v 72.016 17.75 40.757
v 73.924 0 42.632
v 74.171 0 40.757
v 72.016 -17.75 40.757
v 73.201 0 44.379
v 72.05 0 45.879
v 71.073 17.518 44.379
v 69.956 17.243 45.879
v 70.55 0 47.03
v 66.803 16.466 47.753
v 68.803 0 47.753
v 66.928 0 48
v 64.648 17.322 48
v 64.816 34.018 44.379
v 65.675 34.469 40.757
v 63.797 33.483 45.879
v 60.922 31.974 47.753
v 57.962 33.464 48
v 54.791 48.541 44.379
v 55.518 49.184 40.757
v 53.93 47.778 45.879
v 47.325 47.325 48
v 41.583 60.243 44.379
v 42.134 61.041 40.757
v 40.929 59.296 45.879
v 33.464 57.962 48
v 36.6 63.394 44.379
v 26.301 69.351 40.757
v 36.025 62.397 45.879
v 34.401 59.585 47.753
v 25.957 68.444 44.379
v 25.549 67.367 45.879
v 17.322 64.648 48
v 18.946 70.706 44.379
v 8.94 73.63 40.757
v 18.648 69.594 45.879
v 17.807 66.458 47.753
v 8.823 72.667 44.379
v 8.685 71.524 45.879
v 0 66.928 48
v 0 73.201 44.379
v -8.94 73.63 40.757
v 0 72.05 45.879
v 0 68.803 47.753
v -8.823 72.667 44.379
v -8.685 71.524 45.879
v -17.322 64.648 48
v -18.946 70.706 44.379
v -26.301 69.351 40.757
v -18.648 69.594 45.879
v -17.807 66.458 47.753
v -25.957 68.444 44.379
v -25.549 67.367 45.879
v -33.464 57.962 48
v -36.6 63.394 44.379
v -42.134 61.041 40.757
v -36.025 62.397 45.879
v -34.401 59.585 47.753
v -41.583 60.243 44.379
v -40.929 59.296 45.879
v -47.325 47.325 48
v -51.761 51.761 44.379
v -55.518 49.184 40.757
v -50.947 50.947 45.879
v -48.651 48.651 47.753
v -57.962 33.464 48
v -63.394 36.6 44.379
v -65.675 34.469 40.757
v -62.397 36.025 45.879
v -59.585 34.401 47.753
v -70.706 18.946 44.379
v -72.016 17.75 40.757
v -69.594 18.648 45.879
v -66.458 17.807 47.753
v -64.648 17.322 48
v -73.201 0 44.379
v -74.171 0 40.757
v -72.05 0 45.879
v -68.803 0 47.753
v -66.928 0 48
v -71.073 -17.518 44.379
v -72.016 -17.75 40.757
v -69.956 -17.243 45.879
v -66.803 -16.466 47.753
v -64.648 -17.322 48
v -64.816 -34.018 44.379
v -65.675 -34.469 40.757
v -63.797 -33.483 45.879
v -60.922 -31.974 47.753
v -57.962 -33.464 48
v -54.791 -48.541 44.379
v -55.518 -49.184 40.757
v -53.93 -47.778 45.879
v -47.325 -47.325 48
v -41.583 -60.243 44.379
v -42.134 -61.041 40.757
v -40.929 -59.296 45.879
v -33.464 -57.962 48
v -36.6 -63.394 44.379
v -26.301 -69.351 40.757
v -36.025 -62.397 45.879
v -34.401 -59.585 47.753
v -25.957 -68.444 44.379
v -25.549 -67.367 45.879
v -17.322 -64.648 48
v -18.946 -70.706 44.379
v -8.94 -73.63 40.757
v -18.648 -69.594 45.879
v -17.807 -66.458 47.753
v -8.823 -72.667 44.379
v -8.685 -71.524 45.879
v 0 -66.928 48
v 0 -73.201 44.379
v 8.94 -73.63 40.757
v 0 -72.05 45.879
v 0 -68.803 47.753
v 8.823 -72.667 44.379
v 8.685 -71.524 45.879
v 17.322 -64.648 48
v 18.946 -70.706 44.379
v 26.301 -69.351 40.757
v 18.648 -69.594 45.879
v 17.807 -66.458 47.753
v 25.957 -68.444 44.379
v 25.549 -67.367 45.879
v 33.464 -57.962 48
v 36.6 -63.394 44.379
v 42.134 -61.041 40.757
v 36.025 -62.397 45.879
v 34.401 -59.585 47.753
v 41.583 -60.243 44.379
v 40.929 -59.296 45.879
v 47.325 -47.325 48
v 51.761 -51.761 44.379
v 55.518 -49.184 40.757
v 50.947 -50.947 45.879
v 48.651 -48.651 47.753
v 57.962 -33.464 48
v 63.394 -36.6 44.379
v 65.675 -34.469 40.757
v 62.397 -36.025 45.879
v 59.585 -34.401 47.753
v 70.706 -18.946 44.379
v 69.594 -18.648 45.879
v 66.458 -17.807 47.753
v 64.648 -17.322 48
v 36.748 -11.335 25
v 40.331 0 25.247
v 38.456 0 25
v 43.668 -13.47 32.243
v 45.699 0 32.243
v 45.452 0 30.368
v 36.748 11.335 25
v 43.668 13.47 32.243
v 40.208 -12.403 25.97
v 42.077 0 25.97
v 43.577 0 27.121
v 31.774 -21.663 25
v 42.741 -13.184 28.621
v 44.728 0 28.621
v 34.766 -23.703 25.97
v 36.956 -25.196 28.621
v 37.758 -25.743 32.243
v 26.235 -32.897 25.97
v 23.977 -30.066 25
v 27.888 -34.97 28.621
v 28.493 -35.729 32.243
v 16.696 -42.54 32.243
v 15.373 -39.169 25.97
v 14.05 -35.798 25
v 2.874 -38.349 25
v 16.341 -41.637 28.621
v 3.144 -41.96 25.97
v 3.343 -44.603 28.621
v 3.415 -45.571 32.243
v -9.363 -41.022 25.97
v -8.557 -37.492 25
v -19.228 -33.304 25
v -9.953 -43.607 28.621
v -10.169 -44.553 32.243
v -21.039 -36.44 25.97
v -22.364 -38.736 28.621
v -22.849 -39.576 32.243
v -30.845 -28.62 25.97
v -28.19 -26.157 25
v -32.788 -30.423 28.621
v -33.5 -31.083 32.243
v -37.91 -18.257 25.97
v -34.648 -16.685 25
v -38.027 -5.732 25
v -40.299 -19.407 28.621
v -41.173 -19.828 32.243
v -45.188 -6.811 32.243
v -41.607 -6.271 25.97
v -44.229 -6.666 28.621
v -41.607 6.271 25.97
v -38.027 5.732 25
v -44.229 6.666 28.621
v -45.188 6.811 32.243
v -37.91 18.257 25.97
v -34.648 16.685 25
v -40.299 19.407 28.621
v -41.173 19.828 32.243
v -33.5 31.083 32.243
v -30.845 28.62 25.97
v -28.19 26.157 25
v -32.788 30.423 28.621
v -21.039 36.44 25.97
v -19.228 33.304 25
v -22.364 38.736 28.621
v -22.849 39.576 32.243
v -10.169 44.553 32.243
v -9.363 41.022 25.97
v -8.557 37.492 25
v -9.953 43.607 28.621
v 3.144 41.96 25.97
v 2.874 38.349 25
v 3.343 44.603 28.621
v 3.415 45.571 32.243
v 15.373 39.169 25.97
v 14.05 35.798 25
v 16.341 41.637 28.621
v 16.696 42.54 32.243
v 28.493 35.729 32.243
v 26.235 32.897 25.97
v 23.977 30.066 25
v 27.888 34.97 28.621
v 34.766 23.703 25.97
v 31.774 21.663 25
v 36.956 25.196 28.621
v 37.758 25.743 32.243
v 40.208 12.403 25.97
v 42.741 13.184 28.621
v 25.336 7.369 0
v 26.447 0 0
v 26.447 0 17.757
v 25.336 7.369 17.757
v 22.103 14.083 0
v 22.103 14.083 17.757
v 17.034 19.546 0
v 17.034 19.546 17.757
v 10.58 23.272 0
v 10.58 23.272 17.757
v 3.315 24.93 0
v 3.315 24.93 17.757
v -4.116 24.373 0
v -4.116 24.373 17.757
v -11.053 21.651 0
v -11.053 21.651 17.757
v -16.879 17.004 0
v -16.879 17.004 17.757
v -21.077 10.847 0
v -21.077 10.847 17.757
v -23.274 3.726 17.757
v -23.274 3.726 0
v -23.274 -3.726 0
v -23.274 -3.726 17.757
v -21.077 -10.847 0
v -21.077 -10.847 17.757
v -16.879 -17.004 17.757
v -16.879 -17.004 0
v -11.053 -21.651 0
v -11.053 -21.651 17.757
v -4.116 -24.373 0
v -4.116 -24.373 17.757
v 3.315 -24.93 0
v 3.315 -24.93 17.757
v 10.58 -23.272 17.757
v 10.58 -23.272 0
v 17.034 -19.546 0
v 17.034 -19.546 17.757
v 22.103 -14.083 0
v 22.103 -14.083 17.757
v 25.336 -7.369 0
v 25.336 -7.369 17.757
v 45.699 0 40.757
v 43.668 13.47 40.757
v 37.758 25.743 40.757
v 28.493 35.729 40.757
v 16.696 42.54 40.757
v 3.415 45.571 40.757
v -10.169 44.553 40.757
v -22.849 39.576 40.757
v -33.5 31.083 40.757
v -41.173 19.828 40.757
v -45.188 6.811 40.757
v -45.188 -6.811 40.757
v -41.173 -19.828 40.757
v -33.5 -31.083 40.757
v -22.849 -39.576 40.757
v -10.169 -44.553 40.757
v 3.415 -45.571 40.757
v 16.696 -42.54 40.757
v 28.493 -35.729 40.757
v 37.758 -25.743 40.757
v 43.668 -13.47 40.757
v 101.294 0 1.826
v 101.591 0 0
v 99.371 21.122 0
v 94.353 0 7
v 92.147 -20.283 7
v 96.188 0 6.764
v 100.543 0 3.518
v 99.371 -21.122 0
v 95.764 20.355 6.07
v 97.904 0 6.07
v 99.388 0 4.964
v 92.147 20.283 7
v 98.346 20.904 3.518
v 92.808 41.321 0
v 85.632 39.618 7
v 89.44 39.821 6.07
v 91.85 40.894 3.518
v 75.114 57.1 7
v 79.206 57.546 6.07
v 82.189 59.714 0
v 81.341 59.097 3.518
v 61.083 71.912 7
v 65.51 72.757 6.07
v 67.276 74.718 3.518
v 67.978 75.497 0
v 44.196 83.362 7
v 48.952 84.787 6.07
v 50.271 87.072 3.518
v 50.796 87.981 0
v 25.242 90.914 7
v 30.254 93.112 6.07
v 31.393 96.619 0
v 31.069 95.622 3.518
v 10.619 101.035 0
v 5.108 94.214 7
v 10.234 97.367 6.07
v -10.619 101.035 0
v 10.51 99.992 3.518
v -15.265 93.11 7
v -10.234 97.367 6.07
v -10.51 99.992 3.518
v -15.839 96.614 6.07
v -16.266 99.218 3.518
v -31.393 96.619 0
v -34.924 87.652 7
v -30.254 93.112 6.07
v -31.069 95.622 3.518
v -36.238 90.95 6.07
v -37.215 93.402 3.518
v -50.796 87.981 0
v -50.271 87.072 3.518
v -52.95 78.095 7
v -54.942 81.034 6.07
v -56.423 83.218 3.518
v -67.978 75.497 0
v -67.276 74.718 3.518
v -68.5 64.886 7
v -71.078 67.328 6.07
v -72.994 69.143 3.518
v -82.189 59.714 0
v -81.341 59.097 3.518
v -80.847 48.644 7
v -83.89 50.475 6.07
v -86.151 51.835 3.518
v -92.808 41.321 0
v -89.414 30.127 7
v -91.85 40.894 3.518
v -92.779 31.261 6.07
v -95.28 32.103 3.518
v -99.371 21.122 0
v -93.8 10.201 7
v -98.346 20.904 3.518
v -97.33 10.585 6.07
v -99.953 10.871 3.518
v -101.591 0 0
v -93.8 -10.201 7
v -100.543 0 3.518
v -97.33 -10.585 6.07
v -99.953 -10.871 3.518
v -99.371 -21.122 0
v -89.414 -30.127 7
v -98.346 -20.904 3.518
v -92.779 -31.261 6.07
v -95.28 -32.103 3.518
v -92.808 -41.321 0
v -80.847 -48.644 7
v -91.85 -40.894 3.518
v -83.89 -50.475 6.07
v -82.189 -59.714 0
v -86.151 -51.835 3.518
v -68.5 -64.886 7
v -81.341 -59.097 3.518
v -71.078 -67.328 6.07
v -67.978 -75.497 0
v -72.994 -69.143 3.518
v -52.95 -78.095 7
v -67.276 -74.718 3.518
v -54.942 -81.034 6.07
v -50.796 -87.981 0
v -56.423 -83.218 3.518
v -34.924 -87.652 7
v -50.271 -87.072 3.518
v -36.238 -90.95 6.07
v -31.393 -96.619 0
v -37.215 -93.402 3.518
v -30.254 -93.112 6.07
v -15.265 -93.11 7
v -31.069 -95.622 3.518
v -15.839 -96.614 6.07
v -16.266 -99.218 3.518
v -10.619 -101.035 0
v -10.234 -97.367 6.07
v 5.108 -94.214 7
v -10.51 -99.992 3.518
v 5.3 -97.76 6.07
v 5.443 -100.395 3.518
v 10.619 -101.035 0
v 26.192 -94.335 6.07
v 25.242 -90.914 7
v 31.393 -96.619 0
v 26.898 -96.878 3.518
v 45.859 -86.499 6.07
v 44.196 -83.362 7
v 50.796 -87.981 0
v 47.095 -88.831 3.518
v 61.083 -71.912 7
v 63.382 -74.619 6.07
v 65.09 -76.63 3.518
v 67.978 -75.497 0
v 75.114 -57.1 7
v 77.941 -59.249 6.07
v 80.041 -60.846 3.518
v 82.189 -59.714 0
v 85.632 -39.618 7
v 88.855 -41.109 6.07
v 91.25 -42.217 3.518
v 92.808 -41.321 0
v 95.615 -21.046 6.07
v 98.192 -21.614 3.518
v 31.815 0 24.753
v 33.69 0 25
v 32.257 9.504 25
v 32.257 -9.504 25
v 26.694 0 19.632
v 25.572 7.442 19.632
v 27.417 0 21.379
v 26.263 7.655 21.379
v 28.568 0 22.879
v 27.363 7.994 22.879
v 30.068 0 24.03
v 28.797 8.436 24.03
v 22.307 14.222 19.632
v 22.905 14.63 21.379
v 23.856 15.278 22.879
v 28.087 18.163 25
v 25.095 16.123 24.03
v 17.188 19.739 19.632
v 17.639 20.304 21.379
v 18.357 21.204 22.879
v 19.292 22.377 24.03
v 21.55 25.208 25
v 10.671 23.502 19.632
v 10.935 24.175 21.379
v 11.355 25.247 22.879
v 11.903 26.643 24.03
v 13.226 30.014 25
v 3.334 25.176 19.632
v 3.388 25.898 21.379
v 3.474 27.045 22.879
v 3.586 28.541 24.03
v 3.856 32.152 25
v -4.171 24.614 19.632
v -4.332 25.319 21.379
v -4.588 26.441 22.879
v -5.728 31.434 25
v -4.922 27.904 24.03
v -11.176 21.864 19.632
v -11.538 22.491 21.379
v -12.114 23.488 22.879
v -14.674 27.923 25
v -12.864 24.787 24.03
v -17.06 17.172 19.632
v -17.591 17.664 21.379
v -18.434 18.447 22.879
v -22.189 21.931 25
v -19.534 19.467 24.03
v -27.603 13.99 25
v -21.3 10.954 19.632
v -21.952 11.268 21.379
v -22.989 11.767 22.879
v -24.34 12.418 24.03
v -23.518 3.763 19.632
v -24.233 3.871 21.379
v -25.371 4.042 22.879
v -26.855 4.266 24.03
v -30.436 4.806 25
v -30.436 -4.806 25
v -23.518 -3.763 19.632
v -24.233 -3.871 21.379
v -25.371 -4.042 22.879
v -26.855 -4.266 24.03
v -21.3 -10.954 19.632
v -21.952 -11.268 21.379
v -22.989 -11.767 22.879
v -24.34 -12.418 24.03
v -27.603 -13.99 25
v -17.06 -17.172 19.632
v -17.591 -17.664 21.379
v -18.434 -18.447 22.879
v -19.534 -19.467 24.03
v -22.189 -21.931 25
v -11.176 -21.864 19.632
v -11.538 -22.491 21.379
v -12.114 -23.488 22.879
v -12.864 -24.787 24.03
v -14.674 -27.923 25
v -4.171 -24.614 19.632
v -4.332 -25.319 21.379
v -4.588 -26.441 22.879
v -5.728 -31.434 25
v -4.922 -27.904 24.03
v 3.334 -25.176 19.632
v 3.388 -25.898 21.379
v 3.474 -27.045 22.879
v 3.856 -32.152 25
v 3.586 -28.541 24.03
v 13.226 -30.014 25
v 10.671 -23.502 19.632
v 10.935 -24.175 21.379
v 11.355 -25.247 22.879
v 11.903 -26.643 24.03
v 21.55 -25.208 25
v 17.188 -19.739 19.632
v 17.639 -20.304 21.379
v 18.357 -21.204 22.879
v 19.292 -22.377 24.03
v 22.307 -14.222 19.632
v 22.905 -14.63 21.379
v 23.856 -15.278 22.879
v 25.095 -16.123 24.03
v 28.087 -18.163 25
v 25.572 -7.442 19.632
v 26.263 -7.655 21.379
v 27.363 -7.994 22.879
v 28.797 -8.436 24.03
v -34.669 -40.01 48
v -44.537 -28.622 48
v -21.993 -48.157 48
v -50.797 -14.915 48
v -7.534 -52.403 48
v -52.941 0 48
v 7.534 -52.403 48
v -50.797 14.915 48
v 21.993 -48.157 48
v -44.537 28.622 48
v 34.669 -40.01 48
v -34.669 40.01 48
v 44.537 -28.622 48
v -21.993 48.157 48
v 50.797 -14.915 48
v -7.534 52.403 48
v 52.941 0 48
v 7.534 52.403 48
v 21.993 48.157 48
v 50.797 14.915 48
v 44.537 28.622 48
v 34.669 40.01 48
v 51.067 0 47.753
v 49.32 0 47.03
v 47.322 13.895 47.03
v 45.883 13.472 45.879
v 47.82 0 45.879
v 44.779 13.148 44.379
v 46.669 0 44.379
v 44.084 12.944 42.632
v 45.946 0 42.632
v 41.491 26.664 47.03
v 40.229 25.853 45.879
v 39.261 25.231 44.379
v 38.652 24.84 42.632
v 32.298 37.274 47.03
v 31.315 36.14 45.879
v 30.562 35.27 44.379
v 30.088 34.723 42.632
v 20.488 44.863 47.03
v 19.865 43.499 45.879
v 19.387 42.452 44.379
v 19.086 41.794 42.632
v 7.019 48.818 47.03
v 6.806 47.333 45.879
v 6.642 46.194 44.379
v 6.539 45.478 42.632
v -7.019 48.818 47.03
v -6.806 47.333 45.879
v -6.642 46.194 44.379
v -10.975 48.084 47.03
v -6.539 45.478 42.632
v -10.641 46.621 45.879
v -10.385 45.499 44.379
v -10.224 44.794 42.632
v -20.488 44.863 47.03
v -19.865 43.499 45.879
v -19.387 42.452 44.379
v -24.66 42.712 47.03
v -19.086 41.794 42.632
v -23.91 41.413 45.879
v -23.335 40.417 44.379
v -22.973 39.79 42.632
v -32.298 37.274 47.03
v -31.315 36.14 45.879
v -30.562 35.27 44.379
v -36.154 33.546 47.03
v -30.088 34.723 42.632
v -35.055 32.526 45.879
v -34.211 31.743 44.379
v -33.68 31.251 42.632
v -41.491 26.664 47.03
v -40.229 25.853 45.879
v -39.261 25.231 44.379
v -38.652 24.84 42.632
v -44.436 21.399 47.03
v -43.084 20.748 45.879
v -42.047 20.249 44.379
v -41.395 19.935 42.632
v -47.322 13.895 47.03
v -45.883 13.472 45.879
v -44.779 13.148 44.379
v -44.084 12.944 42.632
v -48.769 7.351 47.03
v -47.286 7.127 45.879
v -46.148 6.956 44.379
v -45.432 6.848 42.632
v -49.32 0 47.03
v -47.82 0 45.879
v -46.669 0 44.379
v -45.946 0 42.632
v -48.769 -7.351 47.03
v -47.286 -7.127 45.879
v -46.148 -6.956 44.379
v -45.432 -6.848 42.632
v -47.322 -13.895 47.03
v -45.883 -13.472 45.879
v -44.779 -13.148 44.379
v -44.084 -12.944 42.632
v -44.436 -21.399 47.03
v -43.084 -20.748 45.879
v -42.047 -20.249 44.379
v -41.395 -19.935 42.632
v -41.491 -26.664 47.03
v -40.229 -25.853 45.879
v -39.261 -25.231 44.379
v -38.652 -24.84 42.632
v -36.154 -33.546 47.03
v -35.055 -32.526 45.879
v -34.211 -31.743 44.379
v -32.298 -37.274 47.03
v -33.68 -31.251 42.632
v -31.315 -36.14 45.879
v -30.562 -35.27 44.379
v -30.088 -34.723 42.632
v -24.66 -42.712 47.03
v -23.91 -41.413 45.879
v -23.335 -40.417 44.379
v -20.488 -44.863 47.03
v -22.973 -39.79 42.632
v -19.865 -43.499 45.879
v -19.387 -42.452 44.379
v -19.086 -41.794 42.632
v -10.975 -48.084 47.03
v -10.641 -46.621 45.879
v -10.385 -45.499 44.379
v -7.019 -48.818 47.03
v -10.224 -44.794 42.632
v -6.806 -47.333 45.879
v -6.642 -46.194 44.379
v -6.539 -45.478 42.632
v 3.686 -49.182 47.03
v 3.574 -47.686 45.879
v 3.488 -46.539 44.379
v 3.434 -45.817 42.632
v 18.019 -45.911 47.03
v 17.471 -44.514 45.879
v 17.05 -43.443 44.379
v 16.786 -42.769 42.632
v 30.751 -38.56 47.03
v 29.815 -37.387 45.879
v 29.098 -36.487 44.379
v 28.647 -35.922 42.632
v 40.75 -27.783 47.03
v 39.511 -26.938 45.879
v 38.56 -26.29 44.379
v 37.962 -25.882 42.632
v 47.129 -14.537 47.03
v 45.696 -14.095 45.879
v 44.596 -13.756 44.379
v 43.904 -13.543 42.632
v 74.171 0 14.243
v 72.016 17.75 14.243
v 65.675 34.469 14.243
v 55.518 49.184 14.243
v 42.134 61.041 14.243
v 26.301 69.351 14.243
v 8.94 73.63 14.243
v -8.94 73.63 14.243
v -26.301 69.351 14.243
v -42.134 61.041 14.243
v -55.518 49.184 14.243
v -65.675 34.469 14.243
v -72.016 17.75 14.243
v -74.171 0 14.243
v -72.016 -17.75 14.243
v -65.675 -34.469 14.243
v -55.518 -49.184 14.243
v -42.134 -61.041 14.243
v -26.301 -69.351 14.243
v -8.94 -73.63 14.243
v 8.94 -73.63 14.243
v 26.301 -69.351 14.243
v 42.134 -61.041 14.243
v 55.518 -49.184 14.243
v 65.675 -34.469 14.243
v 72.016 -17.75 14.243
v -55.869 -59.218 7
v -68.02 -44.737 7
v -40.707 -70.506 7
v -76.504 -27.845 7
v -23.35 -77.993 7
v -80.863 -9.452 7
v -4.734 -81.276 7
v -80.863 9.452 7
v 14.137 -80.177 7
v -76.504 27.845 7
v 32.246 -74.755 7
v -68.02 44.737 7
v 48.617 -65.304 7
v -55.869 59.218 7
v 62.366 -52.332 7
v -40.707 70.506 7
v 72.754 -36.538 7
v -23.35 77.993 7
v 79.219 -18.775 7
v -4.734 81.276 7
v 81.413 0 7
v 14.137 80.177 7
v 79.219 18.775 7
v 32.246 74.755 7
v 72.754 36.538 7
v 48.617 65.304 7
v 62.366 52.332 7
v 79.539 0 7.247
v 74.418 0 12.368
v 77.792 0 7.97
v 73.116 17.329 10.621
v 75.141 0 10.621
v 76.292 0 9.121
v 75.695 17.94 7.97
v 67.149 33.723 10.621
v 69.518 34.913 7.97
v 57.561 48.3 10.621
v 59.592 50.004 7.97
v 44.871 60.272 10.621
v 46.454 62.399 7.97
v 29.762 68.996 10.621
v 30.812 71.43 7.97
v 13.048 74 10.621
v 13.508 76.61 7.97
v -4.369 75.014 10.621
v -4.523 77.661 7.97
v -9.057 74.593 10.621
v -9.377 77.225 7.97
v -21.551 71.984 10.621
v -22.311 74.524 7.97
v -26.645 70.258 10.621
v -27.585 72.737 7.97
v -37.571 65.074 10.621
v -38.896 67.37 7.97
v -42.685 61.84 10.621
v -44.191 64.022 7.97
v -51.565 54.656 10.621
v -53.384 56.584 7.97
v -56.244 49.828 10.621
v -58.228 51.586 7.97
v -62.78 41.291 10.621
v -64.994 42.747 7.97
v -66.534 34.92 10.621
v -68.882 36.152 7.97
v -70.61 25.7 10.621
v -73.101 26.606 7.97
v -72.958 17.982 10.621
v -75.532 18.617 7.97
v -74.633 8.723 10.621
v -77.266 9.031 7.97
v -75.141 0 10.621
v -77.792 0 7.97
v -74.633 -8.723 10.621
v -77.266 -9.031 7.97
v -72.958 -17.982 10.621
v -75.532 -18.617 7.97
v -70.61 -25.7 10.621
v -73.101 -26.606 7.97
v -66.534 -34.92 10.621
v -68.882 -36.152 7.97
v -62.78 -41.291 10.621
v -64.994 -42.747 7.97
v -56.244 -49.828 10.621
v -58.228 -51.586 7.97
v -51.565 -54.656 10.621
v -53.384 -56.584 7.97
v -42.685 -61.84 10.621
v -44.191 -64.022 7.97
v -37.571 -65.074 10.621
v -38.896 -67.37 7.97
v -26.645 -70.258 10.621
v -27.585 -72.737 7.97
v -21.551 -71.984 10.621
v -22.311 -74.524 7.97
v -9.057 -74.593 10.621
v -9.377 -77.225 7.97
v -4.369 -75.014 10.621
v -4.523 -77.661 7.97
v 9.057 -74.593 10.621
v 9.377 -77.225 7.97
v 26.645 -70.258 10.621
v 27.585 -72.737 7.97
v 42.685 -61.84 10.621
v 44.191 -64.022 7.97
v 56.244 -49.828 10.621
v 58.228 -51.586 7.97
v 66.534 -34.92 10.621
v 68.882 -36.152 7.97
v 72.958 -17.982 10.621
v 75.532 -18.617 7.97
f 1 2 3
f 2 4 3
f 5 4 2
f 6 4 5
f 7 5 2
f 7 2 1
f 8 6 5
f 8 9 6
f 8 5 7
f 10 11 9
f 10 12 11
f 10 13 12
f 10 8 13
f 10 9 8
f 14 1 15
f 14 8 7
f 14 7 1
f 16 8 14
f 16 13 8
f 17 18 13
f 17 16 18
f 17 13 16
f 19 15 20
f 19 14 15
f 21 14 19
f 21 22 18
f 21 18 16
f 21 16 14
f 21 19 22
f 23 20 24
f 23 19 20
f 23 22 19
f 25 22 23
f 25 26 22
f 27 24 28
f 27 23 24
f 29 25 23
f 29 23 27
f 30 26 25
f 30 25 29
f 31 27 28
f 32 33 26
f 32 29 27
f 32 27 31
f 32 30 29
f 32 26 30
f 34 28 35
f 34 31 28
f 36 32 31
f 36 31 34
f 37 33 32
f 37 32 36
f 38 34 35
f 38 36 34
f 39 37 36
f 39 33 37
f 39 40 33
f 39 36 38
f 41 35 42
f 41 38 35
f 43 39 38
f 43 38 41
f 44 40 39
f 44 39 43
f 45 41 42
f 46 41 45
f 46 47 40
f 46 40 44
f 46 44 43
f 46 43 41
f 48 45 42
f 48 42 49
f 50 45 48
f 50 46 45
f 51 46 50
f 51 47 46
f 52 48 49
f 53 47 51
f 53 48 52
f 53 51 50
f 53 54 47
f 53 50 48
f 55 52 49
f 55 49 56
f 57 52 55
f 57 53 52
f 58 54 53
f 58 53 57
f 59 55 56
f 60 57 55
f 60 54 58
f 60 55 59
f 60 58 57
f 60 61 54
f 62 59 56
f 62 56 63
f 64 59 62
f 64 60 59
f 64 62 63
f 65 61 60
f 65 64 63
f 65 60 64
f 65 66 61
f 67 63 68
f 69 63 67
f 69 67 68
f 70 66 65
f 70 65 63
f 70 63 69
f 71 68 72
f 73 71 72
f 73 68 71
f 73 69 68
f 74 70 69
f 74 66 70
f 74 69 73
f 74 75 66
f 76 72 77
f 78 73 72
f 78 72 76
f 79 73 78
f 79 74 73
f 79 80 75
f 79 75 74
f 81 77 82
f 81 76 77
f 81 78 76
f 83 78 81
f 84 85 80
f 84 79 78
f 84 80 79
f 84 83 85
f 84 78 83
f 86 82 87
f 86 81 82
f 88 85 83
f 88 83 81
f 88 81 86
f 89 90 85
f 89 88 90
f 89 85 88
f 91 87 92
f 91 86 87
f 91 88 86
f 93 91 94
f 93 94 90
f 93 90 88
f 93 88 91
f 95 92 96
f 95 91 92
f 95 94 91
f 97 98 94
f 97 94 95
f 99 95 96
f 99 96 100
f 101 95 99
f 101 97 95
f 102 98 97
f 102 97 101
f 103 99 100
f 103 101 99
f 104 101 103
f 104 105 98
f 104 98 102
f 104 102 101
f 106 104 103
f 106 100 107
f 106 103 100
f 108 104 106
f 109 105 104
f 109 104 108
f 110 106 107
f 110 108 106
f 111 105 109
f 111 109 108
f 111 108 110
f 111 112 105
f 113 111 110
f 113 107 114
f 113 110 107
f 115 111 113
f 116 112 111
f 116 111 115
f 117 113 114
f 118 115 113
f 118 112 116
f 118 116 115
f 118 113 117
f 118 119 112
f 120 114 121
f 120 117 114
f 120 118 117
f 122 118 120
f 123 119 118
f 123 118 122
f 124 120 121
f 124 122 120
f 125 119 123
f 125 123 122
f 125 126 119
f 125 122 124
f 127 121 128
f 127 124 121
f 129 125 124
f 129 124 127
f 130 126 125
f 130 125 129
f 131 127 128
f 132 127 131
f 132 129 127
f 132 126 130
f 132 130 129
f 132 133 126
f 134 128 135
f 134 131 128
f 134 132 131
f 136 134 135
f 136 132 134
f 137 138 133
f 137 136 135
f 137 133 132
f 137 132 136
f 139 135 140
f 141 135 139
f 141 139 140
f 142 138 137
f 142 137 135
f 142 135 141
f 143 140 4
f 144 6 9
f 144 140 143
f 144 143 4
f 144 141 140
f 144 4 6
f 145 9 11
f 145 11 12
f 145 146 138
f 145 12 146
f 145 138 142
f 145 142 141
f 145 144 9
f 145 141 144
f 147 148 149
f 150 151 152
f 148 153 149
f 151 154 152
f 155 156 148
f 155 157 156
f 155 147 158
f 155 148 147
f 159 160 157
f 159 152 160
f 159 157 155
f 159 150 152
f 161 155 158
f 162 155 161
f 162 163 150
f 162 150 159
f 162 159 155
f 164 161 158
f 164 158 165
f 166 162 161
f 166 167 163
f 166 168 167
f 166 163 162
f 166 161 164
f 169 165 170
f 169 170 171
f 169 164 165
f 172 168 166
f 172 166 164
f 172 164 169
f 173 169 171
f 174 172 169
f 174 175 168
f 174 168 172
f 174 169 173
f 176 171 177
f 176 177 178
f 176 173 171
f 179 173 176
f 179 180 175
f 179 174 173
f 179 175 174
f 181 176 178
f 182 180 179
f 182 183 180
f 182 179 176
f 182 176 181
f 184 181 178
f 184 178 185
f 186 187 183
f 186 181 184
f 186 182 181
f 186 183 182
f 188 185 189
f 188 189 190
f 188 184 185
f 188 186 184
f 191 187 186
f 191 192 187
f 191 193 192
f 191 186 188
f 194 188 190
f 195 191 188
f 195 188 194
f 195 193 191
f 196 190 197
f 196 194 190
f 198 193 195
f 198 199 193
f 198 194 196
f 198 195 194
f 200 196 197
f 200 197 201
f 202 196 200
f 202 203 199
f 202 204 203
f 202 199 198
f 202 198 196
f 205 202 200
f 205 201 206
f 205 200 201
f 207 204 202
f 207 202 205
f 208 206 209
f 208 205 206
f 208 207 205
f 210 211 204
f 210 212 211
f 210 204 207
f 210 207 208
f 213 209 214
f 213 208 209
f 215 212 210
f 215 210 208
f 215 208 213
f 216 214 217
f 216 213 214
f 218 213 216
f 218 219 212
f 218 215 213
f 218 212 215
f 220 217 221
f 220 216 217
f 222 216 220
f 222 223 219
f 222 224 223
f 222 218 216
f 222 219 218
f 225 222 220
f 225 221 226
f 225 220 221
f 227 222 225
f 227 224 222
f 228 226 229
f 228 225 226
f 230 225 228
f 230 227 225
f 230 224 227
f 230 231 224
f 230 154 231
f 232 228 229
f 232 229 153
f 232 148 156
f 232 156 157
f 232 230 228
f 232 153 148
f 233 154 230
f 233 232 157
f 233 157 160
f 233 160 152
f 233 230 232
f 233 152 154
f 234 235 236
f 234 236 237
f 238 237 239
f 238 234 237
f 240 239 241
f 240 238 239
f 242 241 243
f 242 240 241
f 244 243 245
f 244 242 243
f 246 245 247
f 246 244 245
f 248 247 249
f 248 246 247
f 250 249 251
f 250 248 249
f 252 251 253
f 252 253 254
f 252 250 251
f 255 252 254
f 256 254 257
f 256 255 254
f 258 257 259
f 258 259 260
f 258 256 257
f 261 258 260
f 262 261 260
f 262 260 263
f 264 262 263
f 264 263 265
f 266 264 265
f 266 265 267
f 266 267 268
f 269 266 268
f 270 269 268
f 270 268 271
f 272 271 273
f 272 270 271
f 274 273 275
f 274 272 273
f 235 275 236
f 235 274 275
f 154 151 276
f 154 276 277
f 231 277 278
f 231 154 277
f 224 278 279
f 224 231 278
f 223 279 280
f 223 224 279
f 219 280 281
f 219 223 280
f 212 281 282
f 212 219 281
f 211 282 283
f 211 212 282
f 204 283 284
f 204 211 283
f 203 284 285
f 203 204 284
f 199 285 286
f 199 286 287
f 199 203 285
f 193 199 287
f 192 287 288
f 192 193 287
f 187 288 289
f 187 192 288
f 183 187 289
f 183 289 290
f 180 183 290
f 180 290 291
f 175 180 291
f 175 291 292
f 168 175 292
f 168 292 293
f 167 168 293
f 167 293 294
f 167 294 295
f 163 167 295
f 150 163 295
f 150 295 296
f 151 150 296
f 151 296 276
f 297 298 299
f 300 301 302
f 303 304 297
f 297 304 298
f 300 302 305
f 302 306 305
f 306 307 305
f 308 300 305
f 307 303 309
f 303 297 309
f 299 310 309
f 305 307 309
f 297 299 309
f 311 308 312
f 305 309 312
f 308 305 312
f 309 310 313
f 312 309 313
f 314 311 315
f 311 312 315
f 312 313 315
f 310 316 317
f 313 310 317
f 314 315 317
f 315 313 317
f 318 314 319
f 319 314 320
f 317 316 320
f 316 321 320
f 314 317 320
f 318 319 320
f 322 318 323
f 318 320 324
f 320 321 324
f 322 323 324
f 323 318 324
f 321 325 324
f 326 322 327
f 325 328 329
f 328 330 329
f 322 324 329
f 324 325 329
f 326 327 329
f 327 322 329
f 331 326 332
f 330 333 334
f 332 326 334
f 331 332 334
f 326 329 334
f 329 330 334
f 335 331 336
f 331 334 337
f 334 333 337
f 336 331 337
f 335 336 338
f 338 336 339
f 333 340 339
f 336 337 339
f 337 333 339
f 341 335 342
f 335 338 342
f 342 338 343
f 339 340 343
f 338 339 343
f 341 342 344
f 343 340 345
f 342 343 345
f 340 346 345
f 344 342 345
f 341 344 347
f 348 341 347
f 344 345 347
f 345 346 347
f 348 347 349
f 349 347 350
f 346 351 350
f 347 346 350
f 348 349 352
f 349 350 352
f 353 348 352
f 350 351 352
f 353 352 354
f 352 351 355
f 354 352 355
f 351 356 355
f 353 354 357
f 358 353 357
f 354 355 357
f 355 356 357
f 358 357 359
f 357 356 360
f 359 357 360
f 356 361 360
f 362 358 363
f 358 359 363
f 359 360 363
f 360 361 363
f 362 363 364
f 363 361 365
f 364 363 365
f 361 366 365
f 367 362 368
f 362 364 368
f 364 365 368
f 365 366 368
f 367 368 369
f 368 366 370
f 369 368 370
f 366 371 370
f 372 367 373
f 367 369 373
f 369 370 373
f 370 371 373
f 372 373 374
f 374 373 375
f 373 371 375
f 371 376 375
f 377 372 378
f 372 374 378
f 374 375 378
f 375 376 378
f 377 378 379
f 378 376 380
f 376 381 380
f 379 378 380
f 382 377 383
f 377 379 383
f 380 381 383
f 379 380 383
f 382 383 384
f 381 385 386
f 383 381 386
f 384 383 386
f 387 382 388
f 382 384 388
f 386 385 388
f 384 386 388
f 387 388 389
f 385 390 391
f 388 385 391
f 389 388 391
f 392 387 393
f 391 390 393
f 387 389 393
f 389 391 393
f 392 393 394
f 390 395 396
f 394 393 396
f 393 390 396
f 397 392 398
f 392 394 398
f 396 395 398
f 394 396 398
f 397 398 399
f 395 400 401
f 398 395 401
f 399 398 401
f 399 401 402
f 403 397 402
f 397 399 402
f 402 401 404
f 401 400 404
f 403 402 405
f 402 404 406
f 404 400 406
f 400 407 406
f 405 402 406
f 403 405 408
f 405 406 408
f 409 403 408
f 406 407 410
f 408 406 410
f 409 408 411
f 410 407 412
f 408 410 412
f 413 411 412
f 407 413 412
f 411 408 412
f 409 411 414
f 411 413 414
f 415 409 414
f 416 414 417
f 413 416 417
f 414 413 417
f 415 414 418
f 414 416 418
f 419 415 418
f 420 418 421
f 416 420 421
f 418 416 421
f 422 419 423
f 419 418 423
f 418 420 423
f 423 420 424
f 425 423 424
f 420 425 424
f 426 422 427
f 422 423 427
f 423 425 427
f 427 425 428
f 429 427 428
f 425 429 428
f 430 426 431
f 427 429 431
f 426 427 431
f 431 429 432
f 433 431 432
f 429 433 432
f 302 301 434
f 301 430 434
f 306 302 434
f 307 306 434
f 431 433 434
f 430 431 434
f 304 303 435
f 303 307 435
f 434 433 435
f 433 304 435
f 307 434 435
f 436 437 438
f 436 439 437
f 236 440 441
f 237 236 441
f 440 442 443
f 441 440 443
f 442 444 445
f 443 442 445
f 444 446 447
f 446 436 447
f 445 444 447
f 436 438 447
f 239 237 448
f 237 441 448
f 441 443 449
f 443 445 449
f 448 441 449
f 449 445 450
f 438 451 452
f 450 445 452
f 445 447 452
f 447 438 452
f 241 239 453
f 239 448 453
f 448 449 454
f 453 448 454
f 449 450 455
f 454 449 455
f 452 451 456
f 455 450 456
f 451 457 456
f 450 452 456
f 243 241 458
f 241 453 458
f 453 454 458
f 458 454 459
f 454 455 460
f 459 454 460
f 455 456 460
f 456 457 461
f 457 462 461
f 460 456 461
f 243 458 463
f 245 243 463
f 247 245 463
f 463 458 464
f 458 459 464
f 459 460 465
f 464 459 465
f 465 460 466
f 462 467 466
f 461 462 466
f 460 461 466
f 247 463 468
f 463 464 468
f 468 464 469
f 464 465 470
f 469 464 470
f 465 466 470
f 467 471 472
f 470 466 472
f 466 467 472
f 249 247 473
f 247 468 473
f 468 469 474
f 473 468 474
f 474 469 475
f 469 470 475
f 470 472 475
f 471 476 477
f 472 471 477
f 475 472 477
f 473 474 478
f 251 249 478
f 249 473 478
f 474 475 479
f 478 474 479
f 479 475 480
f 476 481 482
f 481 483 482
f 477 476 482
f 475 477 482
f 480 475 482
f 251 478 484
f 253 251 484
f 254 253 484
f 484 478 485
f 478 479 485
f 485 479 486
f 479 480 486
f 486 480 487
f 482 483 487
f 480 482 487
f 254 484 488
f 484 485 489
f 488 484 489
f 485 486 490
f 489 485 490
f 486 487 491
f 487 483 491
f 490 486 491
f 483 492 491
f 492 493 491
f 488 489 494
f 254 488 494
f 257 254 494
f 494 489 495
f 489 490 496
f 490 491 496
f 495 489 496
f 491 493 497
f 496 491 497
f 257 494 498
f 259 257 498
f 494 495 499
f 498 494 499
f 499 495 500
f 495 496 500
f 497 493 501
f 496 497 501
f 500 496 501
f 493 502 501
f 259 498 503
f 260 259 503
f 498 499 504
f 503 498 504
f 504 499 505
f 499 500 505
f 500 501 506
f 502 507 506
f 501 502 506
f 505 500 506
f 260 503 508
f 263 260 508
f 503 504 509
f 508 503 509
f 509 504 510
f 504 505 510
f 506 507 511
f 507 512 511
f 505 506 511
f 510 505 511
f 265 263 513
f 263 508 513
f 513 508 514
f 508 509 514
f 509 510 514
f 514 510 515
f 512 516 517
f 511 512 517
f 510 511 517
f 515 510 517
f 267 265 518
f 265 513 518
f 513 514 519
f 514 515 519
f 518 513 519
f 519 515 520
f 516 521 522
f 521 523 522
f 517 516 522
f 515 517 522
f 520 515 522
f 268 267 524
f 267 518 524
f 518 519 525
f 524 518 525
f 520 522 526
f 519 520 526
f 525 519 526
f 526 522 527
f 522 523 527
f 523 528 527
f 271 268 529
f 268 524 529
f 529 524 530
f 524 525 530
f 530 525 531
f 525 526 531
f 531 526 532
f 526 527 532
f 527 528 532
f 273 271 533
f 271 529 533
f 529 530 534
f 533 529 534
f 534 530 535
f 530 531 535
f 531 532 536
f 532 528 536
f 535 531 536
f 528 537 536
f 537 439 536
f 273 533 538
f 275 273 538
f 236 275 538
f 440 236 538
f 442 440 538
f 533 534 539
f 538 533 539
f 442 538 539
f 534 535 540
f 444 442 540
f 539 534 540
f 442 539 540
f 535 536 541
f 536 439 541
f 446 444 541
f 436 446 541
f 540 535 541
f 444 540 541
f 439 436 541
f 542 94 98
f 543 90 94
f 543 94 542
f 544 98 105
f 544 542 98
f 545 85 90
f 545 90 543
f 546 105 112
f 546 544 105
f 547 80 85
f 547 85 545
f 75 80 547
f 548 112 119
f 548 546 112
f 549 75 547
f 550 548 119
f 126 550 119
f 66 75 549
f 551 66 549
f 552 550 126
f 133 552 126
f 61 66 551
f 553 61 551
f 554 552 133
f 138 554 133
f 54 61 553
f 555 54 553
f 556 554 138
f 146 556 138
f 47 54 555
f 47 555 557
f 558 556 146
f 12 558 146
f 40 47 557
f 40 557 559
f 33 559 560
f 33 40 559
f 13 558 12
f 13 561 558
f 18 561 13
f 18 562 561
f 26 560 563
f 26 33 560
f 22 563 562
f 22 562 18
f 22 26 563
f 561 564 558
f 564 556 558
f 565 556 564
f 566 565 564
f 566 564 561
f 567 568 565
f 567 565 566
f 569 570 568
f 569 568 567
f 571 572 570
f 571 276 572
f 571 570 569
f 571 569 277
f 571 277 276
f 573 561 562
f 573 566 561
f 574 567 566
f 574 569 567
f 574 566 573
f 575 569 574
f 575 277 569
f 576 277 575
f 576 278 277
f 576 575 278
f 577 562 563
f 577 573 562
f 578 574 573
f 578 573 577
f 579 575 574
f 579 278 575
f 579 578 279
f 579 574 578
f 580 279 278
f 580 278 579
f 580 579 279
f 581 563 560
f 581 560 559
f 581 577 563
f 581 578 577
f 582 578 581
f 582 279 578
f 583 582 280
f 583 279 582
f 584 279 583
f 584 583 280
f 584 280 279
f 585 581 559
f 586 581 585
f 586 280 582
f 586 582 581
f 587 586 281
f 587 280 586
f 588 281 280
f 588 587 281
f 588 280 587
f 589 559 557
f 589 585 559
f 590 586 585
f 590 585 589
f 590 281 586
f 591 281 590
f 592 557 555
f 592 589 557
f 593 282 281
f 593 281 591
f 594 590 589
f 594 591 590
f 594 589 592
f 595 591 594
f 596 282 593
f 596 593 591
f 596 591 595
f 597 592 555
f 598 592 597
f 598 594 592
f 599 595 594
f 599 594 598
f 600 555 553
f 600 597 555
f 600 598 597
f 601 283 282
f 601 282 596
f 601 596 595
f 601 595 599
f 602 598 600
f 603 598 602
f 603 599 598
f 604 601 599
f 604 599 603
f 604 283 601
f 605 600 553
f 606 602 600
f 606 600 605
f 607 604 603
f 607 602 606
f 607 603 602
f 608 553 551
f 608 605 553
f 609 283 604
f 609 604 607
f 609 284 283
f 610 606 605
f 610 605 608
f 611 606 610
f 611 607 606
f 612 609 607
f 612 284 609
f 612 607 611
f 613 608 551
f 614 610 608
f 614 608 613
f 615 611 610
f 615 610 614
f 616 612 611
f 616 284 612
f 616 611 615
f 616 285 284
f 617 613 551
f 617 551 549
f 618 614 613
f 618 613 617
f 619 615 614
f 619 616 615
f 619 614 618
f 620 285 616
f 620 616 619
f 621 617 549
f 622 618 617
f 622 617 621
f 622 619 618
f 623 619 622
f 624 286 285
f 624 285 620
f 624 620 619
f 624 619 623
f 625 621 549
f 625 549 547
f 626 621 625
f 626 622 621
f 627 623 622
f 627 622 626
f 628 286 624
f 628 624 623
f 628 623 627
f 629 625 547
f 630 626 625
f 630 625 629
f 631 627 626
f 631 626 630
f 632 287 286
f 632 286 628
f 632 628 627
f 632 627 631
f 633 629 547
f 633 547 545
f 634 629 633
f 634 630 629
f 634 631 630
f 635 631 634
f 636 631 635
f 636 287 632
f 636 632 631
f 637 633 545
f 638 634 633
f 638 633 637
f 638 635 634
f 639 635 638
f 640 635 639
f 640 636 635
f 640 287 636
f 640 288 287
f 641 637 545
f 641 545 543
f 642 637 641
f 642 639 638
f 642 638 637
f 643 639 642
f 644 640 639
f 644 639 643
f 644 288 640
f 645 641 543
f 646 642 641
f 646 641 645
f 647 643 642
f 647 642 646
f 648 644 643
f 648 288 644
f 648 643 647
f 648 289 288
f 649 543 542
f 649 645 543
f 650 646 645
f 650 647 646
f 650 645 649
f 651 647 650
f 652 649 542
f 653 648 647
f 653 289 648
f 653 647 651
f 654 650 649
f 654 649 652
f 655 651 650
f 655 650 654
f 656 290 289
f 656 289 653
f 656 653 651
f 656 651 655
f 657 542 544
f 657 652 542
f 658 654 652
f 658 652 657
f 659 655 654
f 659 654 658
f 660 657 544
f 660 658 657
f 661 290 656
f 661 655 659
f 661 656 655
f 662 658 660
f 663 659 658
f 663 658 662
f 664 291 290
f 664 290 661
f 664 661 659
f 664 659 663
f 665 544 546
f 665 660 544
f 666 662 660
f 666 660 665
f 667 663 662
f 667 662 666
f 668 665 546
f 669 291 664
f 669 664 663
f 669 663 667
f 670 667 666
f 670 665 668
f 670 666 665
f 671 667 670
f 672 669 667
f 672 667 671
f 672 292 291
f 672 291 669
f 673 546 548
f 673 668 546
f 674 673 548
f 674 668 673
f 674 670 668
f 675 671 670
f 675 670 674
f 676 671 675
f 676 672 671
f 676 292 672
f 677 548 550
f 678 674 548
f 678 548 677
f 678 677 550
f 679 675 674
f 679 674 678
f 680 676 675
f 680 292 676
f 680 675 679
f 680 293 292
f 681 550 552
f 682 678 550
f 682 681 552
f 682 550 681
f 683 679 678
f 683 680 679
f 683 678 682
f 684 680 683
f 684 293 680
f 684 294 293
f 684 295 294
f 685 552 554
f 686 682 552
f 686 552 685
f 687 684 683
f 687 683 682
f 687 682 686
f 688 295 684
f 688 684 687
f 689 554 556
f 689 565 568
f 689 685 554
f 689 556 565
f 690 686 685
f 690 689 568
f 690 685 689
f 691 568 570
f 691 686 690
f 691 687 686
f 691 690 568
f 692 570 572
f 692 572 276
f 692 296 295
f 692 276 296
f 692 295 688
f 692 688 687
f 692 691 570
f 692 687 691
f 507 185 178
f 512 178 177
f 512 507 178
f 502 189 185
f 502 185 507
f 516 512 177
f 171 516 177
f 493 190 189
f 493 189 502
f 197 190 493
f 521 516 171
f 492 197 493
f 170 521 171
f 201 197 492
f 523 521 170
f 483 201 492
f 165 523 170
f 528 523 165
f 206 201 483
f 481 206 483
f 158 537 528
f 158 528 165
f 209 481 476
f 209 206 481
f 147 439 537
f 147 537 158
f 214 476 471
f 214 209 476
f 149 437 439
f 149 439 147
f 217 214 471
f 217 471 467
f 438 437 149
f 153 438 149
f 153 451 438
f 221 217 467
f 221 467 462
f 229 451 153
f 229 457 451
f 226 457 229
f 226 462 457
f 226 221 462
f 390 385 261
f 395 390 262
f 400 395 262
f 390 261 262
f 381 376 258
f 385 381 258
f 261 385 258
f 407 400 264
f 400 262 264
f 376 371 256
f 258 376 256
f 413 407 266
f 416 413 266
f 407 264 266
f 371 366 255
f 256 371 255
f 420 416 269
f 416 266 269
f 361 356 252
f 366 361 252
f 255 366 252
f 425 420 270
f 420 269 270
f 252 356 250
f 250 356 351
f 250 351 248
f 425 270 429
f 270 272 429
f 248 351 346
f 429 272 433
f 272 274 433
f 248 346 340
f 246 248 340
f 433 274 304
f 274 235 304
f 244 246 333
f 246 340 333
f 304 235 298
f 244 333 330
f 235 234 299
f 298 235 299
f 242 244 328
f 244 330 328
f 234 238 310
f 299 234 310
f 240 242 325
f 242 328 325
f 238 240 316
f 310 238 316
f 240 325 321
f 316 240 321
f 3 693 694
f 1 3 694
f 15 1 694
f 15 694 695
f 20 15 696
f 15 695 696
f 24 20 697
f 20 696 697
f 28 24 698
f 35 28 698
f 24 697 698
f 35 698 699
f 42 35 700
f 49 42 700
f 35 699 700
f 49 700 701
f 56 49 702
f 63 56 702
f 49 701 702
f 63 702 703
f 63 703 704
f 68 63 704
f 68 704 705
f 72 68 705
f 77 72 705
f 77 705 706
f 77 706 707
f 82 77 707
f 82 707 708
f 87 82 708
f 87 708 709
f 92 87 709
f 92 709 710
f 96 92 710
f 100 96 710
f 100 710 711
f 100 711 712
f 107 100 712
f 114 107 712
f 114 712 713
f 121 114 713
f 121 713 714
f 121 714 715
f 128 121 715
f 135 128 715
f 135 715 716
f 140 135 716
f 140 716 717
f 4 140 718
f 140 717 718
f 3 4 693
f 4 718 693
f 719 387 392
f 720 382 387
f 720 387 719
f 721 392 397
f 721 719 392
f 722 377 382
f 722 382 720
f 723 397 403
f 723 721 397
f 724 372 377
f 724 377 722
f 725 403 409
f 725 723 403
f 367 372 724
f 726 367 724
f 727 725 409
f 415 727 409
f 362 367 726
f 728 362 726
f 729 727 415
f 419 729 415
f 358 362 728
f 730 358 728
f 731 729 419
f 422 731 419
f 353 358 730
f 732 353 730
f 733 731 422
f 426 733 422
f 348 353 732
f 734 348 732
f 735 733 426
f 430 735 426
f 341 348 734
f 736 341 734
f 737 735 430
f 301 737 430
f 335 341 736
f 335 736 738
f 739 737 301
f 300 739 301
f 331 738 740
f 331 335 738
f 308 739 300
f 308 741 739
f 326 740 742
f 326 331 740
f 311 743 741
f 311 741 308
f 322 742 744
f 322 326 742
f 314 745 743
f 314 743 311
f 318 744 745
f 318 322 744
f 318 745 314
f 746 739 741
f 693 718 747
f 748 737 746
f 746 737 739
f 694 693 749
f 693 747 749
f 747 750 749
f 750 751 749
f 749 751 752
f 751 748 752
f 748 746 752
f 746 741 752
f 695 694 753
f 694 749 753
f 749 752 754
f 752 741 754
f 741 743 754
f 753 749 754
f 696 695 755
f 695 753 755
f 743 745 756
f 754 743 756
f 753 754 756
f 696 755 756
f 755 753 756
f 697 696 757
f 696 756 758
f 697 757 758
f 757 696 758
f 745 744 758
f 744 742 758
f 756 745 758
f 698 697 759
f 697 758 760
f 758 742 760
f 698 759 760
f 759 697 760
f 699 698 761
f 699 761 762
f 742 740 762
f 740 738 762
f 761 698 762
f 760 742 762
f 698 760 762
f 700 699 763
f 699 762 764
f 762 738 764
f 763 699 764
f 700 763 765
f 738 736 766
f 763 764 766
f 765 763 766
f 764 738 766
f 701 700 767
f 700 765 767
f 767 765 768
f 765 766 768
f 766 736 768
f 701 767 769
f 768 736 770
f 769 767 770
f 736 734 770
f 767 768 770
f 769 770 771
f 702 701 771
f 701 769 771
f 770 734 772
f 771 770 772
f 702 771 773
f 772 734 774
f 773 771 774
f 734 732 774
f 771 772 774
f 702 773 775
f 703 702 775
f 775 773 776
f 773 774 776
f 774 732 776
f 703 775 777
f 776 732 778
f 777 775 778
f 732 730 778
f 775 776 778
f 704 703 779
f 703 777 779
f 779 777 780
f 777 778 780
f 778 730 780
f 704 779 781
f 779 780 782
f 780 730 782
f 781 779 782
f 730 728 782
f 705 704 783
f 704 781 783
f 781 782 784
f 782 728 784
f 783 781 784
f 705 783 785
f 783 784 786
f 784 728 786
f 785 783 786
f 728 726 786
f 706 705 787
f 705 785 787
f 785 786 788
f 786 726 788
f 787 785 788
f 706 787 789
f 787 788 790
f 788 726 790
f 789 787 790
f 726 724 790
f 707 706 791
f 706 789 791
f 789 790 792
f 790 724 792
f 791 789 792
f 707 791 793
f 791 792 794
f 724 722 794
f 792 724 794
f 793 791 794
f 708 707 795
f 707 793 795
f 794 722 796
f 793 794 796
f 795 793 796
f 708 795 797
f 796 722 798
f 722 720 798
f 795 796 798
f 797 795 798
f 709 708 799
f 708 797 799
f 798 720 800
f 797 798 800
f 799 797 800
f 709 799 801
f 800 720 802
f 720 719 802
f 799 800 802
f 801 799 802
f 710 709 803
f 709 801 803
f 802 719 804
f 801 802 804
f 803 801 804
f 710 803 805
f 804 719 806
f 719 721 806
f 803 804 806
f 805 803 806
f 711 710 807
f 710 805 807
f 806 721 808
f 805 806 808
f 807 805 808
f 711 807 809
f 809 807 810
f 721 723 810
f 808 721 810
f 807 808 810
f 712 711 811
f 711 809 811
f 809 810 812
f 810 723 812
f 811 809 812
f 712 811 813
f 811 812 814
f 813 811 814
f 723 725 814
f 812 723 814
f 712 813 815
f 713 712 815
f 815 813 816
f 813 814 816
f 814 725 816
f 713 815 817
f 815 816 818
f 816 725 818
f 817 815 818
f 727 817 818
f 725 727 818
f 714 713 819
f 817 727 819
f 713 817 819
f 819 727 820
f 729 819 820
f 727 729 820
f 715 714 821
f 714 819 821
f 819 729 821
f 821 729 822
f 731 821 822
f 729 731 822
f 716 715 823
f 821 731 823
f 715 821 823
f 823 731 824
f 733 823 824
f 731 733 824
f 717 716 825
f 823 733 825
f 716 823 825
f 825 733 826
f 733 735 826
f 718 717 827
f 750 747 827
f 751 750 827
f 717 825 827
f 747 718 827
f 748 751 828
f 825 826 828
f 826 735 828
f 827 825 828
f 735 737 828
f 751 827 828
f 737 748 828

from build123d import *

# Parameters (mm, degrees)
F1_R     = 74.1708430985
F1_R_2   = 45.6987407436
F2_DEPTH = 48
F0_R     = 50
F0_R_2   = 25
F3_DEPTH = 25
F4_R     = 7.2426406871
F1_R_3   = 101.591361741
F5_DEPTH = 7


# Not quite as in the source:
# - a fillet or chamfer that OpenCascade refuses, or shapes differently, is made with other operations: its cross-section is extruded or revolved along the edge and cut away or added


with BuildPart() as f2:
    # F1 (on Top) → F2 (new body)
    with BuildSketch(Plane.XY):
        Circle(F1_R)
        Circle(F1_R_2, mode=Mode.SUBTRACT)
    extrude(amount=F2_DEPTH)

    # F0 (on Top) → F3 (join)
    with BuildSketch(Plane.XY):
        with Locations((1.4469225327, 0)):
            Circle(F0_R)
        with Locations((1.4469225327, 0)):
            Circle(F0_R_2, mode=Mode.SUBTRACT)
    extrude(amount=F3_DEPTH)

    # F4
    f4_edges = [f2.edges().sort_by_distance(p)[0] for p in [
        (-45.698741, 0, 25),
        (-23.553077, 0, 25),
        (-74.170843, 0, 48),
        (-45.698741, 0, 48),
    ]]
    fillet(f4_edges, radius=F4_R)

    # F1 (on Top) → F5 (join)
    with BuildSketch(Plane.XY):
        Circle(F1_R_3)
        Circle(F1_R, mode=Mode.SUBTRACT)
    extrude(amount=F5_DEPTH)

    # F6: fillet of radius 7.2426406871 on 2 edges, made by hand

    # F6_s1 → F6_t2 (revolve)
    with BuildSketch(Plane.XZ):
        with BuildLine():
            ThreePointArc((74.1708430985, 14.2426406871), (76.2921634421, 9.1213203436), (81.4134837857, 7))
            Line((81.4134837857, 7), (74.1708430985, 7))
            Line((74.1708430985, 7), (74.1708430985, 14.2426406871))
        make_face()
    revolve(axis=Axis((0, 0, 7), (0, 0, 1)))

    # F6_s3 → F6_t4 (revolve, cut)
    with BuildSketch(Plane.XZ):
        with BuildLine():
            ThreePointArc((94.3527866313, 7), (99.3875897461, 4.9637593857), (101.591361741, 0))
            Line((101.591361741, 0), (101.591361741, 7))
            Line((101.591361741, 7), (94.3527866313, 7))
        make_face()
    revolve(axis=Axis((0, 0, 7), (0, 0, 1)), mode=Mode.SUBTRACT)


solid = f2.part
